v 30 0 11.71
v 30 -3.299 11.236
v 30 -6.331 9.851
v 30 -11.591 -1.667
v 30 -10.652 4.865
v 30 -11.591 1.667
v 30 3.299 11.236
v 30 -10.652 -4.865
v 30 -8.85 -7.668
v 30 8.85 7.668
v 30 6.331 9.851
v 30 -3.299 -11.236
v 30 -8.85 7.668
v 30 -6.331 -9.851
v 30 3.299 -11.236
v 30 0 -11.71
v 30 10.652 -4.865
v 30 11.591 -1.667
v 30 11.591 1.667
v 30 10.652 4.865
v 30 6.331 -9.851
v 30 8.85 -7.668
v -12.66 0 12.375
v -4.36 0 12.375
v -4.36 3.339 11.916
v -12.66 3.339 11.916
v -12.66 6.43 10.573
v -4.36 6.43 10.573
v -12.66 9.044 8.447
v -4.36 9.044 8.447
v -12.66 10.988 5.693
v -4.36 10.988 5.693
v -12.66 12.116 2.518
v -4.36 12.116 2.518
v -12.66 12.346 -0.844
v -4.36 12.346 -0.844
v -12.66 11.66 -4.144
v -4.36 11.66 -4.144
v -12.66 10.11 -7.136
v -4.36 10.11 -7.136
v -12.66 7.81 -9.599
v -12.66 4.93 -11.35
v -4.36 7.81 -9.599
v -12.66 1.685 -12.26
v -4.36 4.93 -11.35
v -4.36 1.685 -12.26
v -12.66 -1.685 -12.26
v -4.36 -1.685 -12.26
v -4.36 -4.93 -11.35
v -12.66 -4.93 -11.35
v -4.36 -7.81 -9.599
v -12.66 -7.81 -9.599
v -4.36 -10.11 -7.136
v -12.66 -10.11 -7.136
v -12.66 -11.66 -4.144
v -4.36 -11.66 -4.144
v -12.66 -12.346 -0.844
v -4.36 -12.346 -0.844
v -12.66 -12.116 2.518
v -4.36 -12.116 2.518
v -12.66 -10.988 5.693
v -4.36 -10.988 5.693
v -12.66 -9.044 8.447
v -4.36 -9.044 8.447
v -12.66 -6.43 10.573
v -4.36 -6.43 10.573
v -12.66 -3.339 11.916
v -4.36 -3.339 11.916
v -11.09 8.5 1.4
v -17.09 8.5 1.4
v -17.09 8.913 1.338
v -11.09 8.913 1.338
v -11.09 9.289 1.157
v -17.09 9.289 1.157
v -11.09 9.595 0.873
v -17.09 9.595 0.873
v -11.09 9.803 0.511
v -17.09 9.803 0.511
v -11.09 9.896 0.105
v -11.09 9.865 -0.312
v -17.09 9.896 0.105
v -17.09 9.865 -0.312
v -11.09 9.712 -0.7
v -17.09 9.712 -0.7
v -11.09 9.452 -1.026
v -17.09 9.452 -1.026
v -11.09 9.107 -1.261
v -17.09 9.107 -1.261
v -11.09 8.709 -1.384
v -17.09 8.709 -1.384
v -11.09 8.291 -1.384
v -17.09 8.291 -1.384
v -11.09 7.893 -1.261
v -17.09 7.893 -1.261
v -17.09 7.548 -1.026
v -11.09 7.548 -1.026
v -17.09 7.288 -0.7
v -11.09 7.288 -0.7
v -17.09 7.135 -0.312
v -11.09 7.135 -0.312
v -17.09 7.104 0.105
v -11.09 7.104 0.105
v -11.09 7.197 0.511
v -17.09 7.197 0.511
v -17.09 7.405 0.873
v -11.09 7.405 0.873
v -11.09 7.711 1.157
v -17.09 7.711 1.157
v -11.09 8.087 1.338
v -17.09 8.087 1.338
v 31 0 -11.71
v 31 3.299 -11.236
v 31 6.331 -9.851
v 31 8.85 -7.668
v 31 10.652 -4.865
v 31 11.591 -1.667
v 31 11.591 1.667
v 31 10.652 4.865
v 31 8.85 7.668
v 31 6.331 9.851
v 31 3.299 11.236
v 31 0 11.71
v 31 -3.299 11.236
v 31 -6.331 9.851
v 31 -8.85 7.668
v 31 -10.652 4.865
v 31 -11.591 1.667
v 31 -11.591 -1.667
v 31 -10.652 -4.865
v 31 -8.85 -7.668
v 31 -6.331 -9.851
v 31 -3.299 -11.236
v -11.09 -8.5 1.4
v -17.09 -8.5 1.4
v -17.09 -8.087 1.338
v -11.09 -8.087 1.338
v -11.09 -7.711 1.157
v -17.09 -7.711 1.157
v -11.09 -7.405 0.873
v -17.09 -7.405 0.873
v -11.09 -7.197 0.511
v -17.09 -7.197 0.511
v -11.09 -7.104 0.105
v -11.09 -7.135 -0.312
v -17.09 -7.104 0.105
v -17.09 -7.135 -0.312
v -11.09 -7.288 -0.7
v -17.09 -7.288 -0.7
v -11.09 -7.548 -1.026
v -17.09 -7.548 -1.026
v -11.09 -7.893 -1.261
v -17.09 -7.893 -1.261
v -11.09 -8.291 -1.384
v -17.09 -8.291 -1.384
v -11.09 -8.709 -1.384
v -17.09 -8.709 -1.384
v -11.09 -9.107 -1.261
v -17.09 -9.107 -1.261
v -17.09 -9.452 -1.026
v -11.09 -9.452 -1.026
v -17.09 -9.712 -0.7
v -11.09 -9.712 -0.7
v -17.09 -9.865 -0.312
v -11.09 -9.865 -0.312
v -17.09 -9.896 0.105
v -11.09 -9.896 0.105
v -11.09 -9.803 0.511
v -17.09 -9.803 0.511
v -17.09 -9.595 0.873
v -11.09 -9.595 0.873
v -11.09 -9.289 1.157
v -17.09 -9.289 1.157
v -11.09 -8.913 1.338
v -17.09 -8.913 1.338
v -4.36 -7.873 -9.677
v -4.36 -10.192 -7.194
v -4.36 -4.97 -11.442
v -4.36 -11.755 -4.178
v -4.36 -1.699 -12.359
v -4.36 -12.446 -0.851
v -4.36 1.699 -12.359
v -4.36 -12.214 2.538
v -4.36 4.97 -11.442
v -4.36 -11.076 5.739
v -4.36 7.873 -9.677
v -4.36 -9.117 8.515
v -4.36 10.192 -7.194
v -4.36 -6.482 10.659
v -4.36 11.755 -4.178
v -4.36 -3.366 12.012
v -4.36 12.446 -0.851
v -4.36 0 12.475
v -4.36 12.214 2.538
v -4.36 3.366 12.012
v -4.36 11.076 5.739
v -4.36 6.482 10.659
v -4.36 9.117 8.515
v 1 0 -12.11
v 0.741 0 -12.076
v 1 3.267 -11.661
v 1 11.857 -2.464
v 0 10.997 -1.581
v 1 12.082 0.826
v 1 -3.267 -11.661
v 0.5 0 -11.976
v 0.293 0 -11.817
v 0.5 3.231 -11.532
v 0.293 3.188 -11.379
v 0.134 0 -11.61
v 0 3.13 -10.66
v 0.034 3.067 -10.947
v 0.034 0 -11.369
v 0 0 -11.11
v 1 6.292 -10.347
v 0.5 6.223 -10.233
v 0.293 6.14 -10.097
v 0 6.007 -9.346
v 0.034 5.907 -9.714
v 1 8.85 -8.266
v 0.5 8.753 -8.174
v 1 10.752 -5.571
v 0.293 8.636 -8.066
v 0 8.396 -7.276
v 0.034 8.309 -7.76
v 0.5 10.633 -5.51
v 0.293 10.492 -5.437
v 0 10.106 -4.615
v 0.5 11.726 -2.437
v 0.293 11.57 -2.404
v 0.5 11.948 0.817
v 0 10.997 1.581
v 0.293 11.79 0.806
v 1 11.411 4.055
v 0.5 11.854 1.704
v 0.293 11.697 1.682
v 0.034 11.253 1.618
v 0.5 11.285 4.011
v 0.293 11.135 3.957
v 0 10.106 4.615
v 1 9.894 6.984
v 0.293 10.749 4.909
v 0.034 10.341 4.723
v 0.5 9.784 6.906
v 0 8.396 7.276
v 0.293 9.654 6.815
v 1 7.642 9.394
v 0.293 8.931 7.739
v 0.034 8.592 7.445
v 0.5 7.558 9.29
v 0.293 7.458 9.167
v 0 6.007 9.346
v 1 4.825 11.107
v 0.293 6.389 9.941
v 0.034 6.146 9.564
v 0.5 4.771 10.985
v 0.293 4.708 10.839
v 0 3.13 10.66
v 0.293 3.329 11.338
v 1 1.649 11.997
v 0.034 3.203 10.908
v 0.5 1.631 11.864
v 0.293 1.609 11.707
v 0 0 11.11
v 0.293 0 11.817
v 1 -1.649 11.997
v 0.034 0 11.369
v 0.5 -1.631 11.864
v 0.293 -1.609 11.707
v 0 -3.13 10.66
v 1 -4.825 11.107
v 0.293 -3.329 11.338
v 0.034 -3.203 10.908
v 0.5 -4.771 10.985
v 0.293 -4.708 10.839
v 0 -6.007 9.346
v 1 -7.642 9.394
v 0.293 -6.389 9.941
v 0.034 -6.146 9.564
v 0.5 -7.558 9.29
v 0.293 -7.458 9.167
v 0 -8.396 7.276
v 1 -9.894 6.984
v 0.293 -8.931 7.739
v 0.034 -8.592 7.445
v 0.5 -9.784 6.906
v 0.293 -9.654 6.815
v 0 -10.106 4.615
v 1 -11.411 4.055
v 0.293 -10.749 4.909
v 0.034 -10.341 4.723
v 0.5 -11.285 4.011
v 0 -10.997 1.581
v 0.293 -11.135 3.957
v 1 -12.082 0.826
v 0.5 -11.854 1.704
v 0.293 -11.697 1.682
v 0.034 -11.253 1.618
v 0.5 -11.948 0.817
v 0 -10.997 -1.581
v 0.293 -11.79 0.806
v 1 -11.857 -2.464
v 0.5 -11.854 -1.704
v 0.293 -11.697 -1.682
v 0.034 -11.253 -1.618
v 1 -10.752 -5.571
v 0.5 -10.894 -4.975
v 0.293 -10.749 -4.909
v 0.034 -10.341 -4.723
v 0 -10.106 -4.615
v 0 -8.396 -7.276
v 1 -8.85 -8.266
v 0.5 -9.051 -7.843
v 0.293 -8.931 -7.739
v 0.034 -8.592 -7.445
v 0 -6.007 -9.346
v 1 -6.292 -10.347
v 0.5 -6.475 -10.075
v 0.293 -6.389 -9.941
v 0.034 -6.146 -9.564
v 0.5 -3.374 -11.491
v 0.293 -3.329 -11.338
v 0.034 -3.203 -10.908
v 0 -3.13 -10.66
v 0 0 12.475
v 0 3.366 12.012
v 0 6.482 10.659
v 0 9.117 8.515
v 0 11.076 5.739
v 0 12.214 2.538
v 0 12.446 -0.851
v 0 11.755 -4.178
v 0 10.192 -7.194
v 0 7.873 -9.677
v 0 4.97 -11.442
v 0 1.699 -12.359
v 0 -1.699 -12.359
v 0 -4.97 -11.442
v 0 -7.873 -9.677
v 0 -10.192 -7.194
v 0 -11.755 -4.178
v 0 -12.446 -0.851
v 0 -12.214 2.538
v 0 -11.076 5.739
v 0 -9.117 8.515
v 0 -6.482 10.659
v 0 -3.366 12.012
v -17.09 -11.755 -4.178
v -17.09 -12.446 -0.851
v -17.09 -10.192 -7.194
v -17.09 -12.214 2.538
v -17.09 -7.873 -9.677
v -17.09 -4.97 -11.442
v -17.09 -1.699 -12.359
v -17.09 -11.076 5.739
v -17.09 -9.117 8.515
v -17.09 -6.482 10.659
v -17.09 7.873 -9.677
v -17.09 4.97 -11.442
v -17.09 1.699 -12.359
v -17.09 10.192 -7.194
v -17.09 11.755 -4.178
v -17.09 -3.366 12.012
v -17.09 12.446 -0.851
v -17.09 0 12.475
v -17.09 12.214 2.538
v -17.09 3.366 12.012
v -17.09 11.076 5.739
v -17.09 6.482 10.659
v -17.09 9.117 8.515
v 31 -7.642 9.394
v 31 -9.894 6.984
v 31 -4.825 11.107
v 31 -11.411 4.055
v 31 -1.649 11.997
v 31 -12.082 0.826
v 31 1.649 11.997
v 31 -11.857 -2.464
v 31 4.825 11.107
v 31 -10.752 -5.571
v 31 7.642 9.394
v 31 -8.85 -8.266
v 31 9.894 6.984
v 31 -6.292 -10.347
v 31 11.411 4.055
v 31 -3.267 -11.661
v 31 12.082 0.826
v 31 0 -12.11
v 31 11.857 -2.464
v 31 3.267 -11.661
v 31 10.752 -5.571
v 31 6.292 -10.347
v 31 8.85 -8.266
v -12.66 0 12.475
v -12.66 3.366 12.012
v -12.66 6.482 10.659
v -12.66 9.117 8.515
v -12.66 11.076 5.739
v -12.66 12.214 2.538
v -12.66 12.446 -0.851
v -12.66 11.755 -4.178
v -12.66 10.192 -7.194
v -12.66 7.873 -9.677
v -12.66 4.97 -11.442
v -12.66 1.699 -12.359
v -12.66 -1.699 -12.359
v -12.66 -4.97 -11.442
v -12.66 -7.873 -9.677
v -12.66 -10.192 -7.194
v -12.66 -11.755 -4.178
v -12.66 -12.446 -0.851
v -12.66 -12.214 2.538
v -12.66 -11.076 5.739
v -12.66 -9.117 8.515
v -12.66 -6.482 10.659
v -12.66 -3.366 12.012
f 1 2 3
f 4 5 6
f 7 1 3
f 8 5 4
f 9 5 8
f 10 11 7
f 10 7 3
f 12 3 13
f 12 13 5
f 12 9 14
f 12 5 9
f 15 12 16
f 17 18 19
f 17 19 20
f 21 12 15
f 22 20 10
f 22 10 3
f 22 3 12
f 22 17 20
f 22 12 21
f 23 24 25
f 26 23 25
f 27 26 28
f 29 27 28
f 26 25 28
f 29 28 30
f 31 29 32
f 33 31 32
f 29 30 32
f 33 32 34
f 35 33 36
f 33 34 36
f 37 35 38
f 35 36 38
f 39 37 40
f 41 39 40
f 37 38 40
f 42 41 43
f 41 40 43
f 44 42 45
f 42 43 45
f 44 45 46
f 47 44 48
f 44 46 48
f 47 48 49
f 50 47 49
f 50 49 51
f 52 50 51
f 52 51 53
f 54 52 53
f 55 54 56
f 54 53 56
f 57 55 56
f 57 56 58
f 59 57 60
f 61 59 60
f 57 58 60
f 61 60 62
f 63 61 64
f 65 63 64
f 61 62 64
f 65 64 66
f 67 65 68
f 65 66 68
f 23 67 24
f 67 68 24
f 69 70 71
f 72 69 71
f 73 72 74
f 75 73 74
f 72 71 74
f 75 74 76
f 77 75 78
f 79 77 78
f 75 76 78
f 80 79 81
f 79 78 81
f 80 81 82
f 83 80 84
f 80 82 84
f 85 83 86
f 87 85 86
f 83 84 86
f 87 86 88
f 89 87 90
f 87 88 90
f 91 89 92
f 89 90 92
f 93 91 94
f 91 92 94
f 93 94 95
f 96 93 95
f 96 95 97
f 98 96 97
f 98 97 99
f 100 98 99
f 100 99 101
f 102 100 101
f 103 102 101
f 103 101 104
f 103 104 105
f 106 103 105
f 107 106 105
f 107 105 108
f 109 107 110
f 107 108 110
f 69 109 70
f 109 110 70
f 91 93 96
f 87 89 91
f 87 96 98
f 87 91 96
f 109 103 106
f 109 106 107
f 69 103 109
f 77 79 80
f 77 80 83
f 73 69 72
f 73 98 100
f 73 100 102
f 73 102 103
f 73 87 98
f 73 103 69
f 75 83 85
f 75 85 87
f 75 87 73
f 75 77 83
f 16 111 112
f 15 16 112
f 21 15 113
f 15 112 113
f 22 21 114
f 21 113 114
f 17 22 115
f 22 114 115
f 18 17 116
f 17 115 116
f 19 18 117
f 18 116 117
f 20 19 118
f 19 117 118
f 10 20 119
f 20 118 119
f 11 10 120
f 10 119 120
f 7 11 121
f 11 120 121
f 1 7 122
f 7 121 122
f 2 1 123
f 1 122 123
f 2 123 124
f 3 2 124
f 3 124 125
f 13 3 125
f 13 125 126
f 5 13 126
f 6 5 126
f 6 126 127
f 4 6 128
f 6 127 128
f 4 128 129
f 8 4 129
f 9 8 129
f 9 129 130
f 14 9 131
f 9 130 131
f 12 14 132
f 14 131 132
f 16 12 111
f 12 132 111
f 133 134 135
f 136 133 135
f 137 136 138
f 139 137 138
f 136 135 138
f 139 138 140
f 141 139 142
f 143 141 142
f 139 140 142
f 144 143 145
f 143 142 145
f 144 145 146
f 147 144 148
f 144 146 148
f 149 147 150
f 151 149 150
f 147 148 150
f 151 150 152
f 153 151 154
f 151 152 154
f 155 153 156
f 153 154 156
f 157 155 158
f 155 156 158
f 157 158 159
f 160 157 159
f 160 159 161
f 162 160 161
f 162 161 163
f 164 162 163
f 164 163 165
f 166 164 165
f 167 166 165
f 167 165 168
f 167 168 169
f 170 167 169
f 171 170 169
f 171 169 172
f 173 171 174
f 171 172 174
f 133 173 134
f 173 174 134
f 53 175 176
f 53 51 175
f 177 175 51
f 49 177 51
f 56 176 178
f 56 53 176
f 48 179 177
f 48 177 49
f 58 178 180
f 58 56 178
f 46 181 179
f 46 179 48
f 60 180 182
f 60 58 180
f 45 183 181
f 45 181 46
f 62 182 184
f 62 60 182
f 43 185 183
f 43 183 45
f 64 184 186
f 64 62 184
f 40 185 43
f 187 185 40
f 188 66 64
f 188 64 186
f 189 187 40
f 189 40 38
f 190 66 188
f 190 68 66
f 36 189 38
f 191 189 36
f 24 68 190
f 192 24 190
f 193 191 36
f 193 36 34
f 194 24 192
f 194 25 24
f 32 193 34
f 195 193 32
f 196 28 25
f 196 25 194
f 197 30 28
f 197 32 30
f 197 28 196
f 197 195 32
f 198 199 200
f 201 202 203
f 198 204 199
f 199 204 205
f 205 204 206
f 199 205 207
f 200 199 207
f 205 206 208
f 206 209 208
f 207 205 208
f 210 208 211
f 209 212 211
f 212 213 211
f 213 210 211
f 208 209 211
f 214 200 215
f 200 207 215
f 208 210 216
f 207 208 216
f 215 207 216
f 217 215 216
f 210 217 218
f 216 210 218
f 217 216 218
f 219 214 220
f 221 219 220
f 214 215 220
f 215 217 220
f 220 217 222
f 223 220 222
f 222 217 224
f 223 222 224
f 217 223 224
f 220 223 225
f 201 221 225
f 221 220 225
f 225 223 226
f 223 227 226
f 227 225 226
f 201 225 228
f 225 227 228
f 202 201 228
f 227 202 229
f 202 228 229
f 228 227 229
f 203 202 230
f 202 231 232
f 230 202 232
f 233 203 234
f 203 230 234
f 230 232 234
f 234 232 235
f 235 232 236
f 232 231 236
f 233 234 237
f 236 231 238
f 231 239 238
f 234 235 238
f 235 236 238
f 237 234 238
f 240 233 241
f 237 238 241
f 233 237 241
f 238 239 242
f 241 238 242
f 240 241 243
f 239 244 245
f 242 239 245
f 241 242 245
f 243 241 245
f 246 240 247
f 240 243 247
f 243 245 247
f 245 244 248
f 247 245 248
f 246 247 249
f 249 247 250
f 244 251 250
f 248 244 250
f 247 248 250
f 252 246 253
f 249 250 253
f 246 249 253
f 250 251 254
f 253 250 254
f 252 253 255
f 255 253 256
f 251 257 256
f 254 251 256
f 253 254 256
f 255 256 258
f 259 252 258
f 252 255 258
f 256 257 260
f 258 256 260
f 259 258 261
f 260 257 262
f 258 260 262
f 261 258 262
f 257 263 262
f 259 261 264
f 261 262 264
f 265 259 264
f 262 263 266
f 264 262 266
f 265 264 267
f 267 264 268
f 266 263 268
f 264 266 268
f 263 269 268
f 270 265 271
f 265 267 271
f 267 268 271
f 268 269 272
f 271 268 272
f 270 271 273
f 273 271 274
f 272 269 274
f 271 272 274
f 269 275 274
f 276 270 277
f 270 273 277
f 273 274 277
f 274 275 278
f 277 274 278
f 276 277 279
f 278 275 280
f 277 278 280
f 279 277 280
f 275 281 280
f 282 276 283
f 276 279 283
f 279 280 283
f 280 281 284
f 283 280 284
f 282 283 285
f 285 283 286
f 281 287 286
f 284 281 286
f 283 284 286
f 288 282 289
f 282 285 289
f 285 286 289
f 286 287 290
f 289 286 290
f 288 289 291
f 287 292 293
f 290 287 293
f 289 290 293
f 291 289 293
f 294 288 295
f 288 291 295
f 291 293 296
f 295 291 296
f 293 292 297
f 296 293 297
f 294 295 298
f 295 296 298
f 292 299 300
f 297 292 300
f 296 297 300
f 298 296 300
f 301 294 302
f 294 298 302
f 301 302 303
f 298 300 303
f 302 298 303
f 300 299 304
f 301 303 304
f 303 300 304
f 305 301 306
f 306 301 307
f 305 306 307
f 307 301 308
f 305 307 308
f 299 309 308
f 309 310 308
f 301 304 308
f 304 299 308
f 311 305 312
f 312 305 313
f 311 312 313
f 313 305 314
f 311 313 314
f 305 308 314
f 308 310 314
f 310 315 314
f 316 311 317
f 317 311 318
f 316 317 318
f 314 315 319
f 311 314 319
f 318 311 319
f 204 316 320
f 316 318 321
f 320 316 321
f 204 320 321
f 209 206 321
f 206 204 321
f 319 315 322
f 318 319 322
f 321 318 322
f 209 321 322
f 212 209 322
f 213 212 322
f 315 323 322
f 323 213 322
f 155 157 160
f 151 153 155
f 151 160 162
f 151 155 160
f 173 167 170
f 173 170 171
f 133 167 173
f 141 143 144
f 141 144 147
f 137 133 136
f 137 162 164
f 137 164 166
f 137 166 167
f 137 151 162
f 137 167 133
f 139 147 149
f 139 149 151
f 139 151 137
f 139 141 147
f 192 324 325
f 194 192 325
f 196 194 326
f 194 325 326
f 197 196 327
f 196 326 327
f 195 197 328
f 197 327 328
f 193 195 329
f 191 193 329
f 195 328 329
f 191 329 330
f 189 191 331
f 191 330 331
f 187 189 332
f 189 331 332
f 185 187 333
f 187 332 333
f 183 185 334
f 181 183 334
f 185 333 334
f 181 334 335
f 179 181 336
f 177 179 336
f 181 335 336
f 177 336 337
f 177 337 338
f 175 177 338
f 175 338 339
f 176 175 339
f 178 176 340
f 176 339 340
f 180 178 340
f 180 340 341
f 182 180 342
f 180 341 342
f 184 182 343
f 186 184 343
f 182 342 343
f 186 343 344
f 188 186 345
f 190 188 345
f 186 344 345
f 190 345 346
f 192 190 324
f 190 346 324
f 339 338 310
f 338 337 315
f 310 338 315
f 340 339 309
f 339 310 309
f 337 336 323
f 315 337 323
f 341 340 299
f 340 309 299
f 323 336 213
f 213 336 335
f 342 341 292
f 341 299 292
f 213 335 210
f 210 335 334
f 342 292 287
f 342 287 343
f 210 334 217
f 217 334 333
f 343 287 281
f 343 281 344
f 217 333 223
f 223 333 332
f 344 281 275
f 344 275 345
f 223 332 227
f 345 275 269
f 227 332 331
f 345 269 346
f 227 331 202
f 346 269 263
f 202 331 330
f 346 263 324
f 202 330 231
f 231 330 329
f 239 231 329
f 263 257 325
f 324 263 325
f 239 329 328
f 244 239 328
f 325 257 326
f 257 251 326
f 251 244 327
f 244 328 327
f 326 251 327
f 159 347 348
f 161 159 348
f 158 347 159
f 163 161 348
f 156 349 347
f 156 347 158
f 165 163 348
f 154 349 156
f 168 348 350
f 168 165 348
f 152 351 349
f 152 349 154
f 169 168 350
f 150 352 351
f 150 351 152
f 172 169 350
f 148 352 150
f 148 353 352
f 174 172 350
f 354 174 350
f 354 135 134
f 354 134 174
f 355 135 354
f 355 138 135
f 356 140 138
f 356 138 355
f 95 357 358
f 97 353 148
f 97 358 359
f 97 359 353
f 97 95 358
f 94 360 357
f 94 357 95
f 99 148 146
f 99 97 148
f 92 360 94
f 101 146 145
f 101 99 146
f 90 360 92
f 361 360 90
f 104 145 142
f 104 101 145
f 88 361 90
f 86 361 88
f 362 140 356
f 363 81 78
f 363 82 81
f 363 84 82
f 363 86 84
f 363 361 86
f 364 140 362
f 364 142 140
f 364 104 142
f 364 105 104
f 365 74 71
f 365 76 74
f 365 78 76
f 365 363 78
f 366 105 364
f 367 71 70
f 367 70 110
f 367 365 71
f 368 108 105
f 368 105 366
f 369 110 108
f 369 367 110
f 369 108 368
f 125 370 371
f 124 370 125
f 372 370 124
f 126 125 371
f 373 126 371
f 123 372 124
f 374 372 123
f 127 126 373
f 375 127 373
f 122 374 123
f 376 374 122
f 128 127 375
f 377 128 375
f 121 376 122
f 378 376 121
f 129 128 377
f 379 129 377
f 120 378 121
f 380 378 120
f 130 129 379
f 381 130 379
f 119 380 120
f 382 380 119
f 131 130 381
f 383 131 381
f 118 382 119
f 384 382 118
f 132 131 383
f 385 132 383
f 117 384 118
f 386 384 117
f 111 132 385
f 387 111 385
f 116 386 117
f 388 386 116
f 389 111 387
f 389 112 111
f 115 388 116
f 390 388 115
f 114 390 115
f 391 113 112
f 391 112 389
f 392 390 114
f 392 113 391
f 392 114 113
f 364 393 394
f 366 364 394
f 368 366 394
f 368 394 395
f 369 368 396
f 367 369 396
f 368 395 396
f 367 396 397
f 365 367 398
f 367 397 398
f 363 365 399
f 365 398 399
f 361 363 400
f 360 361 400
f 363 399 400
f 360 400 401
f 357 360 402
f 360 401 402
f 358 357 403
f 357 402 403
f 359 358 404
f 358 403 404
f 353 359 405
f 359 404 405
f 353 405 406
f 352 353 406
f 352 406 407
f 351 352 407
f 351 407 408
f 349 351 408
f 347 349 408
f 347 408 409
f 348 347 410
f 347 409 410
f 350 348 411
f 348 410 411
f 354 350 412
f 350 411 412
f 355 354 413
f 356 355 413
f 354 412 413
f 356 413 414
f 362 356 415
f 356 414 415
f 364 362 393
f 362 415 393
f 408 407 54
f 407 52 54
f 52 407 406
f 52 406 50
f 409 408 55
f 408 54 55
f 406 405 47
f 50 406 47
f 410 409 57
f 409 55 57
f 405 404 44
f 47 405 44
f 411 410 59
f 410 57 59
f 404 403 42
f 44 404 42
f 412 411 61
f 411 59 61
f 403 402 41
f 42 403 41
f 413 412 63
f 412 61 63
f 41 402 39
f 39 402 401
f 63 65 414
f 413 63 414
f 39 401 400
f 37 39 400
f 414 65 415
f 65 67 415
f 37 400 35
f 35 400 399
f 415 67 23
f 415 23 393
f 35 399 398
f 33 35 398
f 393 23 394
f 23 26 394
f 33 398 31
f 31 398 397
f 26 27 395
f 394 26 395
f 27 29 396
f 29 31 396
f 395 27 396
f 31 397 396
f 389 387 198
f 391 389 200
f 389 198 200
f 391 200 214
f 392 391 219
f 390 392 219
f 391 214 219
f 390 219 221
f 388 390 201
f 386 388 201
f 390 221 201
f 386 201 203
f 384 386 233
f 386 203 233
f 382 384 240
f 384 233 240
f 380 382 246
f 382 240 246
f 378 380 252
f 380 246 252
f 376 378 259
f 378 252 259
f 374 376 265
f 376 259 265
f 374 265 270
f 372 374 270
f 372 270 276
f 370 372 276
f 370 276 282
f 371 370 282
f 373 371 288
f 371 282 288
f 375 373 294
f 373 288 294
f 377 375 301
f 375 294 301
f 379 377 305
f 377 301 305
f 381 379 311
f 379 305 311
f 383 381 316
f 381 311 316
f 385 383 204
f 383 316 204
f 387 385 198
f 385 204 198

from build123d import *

# Parameters (mm, degrees)
SKETCH1_R           = 12.11
BOSS_EXTRUDE1_DEPTH = 31
FILLET1_R           = 1
SKETCH2_R           = 11.71
CUT_EXTRUDE1_DEPTH  = 1
SKETCH3_R           = 12.475
BOSS_EXTRUDE2_DEPTH = 4.36
SKETCH4_R           = 12.375
BOSS_EXTRUDE3_DEPTH = 8.3
SKETCH5_R           = 12.475
BOSS_EXTRUDE4_DEPTH = 4.43
SKETCH6_R           = 1.4
CUT_EXTRUDE2_DEPTH  = 6


with BuildPart() as part:
    # Sketch1 → Boss-Extrude1 (new body)
    with BuildSketch(Plane(origin=(0, 0, 0), x_dir=(0, 0, -1), z_dir=(1, 0, 0))):
        Circle(SKETCH1_R)
    extrude(amount=BOSS_EXTRUDE1_DEPTH)

    # Fillet1
    fillet1_edges = [part.edges().sort_by_distance(p)[0] for p in [
        (0, 0, 12.11),
    ]]
    fillet(fillet1_edges, radius=FILLET1_R)

    # Sketch2 → Cut-Extrude1 (cut)
    with BuildSketch(Plane(origin=(31, 0, 0), x_dir=(0, 0, -1), z_dir=(1, 0, 0))):
        Circle(SKETCH2_R)
    extrude(amount=-CUT_EXTRUDE1_DEPTH, mode=Mode.SUBTRACT)

    # Sketch3 → Boss-Extrude2 (add)
    with BuildSketch(Plane.ZY):
        Circle(SKETCH3_R)
    extrude(amount=BOSS_EXTRUDE2_DEPTH)

    # Sketch4 → Boss-Extrude3 (add)
    with BuildSketch(Plane.ZY.offset(4.36)):
        Circle(SKETCH4_R)
    extrude(amount=BOSS_EXTRUDE3_DEPTH)

    # Sketch5 → Boss-Extrude4 (add)
    with BuildSketch(Plane.ZY.offset(12.66)):
        Circle(SKETCH5_R)
    extrude(amount=BOSS_EXTRUDE4_DEPTH)

    # Sketch6 → Cut-Extrude2 (cut)
    with BuildSketch(Plane.ZY.offset(17.09)):
        with Locations((0, 8.5)):
            Circle(SKETCH6_R)
        with Locations((0, -8.5)):
            Circle(SKETCH6_R)
    extrude(amount=-CUT_EXTRUDE2_DEPTH, mode=Mode.SUBTRACT)


solid = part.part
